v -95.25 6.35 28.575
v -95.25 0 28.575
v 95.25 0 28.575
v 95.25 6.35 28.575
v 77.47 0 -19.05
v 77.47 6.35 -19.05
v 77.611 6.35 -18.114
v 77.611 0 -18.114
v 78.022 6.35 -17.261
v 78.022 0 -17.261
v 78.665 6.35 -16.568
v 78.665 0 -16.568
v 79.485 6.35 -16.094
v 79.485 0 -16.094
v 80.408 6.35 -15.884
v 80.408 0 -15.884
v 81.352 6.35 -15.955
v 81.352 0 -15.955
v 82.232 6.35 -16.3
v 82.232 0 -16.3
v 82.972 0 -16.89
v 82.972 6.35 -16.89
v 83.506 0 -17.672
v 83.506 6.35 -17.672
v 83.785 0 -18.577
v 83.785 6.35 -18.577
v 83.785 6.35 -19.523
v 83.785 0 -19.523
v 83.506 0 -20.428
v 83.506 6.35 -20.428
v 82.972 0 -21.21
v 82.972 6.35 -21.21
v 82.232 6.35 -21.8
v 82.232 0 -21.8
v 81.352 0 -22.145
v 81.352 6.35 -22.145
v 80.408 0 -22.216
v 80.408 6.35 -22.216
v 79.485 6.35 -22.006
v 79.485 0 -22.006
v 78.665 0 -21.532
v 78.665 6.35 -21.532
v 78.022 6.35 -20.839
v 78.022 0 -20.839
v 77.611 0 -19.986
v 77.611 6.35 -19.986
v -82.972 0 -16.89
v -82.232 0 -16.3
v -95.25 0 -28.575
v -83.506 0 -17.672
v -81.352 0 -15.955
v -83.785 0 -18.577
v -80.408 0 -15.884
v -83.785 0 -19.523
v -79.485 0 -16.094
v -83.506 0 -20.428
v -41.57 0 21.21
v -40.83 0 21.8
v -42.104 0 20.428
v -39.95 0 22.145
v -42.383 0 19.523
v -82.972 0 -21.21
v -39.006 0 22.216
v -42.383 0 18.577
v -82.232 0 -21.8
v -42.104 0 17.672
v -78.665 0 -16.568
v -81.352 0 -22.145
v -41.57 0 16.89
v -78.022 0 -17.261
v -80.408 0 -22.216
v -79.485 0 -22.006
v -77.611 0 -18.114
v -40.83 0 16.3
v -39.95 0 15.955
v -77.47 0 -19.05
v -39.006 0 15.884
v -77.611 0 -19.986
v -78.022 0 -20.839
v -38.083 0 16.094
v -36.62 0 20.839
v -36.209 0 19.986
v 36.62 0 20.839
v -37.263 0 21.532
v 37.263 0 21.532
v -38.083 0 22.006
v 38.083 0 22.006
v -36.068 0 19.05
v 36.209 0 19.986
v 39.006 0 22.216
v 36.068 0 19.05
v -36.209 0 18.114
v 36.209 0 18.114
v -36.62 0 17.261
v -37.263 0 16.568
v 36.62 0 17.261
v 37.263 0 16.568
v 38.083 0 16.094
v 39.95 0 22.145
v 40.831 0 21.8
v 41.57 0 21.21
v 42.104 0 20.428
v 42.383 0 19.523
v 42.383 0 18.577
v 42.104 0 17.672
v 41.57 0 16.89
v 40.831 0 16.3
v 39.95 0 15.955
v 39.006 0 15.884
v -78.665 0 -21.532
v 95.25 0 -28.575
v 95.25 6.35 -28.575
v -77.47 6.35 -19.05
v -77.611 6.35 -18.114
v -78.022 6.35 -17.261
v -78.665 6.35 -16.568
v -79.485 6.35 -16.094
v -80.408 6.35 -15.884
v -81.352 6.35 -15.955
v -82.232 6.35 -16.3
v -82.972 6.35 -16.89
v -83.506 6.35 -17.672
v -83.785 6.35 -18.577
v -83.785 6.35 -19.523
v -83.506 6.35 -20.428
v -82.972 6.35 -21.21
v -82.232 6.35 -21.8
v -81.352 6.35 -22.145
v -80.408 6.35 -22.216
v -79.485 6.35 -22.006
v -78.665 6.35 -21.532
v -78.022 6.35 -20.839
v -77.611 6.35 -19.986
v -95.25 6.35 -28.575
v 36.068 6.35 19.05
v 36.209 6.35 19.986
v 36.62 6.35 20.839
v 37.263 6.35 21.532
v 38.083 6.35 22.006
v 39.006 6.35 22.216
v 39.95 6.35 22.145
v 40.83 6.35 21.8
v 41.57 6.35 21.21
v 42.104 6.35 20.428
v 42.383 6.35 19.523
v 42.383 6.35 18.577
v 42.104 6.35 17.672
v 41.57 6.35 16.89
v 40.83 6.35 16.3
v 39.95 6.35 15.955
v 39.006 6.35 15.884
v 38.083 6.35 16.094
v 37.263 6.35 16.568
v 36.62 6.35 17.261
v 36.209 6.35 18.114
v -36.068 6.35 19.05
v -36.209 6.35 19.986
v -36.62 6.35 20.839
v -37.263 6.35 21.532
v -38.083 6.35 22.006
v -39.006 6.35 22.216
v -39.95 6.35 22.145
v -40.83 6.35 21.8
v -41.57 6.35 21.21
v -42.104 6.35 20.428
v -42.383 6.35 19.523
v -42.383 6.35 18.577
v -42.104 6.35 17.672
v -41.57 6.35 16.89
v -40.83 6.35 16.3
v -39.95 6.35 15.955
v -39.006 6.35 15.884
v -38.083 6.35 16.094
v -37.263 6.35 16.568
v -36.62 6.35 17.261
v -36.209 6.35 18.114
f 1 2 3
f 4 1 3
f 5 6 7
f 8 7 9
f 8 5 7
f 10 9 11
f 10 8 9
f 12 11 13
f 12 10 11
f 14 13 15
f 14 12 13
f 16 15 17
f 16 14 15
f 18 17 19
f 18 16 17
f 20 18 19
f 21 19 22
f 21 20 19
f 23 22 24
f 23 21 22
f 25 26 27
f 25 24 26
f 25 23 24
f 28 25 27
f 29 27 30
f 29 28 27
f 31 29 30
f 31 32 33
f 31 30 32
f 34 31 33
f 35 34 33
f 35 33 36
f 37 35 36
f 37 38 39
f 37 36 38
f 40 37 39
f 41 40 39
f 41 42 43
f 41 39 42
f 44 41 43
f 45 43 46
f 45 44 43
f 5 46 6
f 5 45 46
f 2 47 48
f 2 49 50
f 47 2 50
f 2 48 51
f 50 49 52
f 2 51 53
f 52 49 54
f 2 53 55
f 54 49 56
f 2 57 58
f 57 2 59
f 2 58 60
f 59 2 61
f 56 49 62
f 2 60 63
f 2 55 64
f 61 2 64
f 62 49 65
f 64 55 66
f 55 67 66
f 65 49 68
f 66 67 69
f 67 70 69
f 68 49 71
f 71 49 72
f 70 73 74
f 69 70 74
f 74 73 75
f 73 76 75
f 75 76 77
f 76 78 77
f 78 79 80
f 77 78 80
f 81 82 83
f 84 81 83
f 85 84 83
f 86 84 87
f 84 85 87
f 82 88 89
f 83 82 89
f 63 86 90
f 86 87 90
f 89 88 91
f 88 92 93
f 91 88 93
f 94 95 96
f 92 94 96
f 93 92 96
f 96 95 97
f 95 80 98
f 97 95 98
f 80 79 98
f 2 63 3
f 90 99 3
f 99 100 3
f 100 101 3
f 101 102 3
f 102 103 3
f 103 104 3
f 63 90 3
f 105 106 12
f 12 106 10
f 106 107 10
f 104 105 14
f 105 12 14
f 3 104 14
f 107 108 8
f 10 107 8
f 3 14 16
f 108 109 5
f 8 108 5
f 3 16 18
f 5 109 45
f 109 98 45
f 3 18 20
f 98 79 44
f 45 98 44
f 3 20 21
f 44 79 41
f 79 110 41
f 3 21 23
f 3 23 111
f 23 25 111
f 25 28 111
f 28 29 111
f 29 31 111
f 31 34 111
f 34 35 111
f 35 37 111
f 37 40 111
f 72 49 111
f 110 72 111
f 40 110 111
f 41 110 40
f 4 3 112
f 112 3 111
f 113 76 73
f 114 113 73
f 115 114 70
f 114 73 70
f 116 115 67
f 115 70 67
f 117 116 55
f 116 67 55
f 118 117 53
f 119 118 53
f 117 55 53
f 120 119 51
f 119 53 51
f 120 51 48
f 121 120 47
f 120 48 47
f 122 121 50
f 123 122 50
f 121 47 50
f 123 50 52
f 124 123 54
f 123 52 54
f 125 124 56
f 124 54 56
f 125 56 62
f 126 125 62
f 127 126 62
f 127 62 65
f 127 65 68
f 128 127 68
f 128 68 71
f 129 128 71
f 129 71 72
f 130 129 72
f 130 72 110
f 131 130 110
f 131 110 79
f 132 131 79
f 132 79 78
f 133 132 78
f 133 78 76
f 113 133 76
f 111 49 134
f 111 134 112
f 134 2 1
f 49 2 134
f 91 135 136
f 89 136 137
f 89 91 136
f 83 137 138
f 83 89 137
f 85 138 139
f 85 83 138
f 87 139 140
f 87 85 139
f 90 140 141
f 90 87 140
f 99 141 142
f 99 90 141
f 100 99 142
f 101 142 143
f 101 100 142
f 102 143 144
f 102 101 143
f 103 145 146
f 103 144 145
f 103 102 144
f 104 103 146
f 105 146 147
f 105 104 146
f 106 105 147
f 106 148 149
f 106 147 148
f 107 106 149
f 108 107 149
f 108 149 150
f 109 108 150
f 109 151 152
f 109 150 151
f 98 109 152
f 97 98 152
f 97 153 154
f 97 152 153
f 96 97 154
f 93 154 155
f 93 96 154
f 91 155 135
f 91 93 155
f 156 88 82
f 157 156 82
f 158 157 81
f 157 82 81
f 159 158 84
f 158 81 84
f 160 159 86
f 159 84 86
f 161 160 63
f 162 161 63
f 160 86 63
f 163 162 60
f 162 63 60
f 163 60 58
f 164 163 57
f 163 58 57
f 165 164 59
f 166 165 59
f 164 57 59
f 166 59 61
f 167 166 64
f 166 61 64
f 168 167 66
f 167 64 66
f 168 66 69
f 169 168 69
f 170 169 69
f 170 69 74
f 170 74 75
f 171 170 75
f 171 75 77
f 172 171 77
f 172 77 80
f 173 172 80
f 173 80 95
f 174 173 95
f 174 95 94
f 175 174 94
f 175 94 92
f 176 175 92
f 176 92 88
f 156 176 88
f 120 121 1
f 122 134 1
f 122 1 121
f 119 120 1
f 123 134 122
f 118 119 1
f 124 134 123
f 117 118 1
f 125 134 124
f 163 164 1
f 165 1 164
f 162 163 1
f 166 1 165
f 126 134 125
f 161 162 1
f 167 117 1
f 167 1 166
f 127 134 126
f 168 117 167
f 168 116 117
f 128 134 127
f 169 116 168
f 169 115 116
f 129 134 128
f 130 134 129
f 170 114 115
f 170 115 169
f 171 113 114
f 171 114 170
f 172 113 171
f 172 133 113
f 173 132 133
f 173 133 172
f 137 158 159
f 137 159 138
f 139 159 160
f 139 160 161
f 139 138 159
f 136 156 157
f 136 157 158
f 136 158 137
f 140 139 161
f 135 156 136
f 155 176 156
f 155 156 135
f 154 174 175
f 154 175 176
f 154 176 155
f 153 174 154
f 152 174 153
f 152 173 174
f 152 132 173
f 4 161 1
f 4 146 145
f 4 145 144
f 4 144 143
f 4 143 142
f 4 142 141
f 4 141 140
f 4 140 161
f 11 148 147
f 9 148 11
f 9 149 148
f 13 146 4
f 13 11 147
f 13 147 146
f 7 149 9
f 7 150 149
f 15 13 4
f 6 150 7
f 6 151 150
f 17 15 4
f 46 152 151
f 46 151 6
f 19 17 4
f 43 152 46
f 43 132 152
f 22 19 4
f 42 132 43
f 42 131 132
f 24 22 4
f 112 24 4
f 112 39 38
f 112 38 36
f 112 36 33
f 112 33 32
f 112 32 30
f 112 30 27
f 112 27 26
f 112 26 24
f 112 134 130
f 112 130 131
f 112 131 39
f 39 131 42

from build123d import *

# Parameters (mm, degrees)
SKETCH1_W           = 190.5
SKETCH1_H           = 57.15
BOSS_EXTRUDE1_DEPTH = 6.35
SKETCH3_R           = 3.175
CUT_EXTRUDE2_DEPTH  = 7.35


with BuildPart() as part:
    # Sketch1 → Boss-Extrude1 (new body)
    with BuildSketch(Plane(origin=(0, 0, 0), x_dir=(1, 0, 0), z_dir=(0, 1, 0))):
        Rectangle(SKETCH1_W, SKETCH1_H)
    extrude(amount=BOSS_EXTRUDE1_DEPTH)

    # Sketch3 → Cut-Extrude2 (cut, through all)
    with BuildSketch(Plane.XZ):
        with Locations((-80.645, -19.05)):
            Circle(SKETCH3_R)
        with Locations((-39.243, 19.05)):
            Circle(SKETCH3_R)
    cut_extrude2 = extrude(amount=-CUT_EXTRUDE2_DEPTH, mode=Mode.SUBTRACT)

    # Mirror1: Cut-Extrude2 across plane
    add(cut_extrude2.mirror(Plane(origin=(0, 0, 0), x_dir=(0, 0, 1), z_dir=(1, 0, 0))), mode=Mode.SUBTRACT)


solid = part.part
